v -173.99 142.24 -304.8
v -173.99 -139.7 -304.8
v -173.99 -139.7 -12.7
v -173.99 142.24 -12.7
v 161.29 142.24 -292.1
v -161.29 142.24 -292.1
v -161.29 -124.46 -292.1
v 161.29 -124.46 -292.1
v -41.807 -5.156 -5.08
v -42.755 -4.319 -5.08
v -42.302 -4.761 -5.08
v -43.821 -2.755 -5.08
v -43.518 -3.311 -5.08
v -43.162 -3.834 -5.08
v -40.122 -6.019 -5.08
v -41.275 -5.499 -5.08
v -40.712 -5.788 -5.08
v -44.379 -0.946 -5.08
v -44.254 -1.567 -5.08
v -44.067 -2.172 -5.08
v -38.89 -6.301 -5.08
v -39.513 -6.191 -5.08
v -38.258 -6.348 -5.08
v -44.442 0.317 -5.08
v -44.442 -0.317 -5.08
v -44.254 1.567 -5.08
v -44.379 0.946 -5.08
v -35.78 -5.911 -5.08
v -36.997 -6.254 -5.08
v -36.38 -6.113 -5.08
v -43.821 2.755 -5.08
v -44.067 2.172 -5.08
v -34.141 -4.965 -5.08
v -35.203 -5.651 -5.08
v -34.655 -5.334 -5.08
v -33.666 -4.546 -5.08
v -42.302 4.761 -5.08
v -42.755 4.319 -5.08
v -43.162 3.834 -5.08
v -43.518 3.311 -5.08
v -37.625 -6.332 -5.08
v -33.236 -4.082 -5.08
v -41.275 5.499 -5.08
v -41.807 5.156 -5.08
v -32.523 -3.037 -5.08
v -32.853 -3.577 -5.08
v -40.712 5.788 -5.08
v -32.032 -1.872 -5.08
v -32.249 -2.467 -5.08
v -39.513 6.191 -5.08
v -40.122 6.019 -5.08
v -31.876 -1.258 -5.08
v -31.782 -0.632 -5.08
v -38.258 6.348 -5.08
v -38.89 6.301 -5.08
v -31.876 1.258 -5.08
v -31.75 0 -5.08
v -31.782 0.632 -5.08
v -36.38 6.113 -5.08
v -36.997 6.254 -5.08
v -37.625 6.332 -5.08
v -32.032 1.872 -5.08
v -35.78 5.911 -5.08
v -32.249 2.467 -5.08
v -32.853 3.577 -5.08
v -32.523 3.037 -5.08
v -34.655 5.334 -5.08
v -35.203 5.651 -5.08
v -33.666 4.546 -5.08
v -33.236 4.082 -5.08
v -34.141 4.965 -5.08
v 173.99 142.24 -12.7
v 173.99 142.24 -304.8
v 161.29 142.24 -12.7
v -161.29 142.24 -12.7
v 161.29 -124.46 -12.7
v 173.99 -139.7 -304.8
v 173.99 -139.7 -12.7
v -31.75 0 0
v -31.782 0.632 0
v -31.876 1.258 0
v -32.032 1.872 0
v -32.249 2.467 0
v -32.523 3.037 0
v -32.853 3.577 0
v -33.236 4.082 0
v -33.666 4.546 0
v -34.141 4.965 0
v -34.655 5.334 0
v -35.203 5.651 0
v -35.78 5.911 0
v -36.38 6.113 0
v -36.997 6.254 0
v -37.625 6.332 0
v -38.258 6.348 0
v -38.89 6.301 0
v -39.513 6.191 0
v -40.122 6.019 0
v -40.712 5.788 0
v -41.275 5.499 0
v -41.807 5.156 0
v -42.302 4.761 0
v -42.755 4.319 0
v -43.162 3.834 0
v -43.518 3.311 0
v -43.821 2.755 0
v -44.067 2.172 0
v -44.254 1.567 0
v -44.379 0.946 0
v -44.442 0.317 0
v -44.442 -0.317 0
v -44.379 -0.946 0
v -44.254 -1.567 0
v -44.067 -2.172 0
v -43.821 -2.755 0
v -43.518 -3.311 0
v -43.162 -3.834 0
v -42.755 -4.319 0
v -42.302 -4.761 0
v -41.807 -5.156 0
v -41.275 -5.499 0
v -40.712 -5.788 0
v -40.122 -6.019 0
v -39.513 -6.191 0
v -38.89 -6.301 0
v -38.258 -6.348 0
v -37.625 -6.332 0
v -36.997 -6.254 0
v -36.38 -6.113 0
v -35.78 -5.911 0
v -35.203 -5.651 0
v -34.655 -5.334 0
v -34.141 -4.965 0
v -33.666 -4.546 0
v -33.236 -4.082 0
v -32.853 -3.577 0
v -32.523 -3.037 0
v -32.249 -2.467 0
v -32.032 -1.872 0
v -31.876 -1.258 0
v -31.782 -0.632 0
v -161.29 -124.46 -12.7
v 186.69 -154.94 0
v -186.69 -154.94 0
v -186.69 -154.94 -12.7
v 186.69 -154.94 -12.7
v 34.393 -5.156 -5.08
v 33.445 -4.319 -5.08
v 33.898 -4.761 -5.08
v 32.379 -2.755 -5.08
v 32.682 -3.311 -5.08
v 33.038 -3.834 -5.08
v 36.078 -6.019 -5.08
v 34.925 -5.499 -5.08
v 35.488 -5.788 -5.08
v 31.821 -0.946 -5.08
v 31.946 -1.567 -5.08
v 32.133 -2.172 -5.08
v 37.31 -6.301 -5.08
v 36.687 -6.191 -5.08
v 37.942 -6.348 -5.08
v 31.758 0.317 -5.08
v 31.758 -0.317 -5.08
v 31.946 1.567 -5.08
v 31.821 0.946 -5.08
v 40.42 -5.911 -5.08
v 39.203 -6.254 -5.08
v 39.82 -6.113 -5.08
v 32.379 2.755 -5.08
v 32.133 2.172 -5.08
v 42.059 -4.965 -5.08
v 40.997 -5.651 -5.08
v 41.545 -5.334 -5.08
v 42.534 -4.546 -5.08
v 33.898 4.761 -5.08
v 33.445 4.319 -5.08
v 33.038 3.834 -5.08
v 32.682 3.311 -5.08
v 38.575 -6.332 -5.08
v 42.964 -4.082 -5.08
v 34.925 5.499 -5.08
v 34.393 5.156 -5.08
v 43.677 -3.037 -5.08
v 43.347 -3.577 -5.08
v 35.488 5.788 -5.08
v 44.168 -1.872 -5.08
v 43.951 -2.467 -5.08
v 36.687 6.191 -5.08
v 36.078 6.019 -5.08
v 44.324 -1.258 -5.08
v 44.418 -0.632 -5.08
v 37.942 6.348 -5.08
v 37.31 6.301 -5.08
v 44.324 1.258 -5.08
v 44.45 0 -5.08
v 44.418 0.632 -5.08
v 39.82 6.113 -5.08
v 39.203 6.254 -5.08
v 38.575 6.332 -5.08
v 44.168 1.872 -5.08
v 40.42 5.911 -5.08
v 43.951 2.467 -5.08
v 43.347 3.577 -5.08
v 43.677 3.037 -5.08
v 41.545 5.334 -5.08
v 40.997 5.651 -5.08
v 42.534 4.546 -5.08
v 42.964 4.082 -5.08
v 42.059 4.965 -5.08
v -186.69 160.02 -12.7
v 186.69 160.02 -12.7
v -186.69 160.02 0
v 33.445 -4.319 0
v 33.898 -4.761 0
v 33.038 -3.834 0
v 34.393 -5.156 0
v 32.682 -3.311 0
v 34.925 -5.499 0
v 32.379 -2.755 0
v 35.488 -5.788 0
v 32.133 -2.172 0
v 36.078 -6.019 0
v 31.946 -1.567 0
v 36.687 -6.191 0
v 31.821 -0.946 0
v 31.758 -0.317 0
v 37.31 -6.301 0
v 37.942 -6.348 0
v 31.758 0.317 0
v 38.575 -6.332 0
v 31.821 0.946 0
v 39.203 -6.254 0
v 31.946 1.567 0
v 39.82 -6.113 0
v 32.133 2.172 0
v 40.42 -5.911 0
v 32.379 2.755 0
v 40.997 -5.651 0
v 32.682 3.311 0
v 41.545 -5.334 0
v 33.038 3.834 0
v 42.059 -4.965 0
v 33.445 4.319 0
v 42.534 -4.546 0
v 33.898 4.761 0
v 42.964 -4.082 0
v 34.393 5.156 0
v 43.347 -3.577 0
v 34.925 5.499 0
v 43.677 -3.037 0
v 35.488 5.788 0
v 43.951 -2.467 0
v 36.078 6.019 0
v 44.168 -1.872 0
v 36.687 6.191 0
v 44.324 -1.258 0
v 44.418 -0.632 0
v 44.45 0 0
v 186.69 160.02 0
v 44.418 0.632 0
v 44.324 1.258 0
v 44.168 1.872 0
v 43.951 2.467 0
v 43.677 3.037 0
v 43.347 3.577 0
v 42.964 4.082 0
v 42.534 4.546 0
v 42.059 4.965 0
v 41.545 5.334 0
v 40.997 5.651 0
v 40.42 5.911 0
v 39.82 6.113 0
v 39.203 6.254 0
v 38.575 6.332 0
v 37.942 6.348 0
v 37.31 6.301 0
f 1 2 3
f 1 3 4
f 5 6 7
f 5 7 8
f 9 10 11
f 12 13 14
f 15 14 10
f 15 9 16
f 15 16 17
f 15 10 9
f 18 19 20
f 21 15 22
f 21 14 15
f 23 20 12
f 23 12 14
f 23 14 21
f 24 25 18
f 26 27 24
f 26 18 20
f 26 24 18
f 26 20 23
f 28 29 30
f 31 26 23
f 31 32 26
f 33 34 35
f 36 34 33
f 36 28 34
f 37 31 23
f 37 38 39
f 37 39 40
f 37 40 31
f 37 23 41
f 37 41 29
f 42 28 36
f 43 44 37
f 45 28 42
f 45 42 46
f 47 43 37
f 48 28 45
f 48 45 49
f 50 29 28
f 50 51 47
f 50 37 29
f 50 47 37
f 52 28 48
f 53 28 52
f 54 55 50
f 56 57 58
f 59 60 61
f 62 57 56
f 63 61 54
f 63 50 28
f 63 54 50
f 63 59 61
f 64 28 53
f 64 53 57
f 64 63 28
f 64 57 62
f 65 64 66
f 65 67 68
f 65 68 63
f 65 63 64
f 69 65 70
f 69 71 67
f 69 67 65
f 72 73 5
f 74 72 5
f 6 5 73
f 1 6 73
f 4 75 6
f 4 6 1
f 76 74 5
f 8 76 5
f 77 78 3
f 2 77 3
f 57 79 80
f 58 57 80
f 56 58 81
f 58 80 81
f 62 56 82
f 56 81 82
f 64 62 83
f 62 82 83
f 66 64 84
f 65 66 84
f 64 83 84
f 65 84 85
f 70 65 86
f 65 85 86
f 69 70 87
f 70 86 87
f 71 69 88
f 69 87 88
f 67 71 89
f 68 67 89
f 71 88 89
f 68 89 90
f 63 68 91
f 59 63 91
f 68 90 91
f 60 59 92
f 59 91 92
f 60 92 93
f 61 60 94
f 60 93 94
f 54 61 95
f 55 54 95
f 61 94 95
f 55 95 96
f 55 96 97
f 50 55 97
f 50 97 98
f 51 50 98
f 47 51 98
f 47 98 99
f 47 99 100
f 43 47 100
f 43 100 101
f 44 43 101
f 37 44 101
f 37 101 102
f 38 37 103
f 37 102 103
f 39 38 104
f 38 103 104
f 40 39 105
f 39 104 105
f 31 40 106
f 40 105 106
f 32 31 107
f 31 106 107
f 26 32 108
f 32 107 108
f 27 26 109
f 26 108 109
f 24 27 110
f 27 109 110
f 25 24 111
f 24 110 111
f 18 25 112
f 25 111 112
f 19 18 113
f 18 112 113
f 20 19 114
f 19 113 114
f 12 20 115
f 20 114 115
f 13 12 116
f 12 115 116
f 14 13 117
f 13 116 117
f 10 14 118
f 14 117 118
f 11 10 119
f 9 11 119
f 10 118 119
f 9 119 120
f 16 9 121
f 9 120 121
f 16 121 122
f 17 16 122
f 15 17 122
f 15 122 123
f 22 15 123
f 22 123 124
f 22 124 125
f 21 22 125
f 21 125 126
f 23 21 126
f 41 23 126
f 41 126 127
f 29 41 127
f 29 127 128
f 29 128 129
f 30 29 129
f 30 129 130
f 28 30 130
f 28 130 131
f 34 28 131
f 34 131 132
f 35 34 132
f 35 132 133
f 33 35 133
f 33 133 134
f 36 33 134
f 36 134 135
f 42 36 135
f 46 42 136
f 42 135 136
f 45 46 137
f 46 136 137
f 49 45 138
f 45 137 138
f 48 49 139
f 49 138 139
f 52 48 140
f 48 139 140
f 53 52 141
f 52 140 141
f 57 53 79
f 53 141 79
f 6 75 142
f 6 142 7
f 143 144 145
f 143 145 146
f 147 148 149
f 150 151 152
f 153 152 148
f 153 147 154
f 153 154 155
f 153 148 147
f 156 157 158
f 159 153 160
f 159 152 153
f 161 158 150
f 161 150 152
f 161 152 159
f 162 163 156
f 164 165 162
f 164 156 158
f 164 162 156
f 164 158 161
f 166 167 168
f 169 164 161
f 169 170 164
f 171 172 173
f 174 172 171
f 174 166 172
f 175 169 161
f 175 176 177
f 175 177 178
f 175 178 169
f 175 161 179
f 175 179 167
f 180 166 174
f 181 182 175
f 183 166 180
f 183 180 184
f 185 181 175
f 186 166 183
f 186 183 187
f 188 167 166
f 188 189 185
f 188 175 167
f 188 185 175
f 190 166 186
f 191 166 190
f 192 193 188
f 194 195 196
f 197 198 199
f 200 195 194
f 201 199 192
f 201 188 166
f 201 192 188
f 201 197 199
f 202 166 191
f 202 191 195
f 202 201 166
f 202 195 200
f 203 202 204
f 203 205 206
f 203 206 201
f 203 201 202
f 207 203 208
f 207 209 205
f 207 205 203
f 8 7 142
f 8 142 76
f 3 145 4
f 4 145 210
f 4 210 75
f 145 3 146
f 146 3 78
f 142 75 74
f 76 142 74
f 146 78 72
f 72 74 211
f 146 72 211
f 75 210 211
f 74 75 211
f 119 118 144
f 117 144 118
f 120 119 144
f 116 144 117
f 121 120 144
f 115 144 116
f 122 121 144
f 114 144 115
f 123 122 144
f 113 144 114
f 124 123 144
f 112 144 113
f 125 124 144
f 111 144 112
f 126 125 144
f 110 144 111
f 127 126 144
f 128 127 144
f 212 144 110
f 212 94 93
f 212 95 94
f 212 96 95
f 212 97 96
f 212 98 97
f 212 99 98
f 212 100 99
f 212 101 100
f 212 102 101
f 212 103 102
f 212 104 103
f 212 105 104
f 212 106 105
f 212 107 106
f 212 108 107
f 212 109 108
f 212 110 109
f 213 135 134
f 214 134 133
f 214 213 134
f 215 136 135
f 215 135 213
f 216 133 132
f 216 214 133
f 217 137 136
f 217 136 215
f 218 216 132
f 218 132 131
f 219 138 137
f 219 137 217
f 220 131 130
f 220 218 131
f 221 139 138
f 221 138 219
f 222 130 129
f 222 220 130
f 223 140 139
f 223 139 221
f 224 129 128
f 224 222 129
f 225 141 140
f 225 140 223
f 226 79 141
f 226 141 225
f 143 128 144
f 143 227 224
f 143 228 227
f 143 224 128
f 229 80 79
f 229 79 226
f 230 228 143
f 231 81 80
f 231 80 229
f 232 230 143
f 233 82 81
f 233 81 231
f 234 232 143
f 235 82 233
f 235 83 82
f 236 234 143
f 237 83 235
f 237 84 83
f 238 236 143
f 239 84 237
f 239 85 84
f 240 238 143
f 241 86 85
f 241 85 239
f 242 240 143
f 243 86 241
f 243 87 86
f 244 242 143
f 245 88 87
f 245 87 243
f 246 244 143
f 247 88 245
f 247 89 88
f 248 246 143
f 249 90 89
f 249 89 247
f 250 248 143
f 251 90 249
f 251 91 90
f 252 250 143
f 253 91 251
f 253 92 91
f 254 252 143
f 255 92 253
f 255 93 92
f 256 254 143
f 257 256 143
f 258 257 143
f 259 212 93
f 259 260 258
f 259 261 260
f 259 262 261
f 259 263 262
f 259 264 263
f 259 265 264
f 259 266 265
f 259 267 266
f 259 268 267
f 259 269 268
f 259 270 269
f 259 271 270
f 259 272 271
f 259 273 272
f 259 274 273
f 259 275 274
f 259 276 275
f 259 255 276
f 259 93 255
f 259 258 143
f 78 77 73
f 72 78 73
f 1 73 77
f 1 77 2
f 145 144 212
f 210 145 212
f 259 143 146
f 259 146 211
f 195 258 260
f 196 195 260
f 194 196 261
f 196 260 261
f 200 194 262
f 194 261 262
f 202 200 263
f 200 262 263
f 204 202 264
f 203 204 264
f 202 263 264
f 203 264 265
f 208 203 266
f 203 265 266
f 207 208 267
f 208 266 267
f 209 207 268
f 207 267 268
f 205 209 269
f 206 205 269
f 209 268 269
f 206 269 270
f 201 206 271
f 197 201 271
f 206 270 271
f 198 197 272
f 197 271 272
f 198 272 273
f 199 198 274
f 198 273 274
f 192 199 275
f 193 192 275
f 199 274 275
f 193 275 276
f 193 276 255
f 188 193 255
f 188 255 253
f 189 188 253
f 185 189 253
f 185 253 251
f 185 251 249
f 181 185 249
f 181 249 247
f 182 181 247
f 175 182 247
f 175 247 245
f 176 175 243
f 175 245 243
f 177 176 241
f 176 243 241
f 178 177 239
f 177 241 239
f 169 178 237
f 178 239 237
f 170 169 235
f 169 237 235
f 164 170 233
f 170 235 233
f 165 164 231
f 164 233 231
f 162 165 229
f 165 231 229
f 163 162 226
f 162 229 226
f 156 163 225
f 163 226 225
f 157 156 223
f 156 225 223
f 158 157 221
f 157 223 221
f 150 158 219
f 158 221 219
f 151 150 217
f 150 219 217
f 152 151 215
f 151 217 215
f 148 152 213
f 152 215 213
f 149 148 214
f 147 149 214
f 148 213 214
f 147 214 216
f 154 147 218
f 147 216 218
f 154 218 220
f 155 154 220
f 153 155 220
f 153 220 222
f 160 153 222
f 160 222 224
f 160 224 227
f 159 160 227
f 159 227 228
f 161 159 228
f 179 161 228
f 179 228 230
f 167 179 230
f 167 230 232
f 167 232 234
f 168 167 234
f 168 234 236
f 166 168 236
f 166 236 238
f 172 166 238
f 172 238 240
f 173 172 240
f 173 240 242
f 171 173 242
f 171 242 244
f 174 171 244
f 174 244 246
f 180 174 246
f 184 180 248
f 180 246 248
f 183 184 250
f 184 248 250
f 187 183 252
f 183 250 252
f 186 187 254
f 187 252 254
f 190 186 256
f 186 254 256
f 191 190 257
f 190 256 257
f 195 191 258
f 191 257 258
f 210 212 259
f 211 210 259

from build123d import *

# Parameters (mm, degrees)
SKETCH1_W           = 373.38
SKETCH1_H           = 309.88
BOSS_EXTRUDE1_DEPTH = 12.7
SKETCH2_W           = 347.98
SKETCH2_H           = 281.94
BOSS_EXTRUDE2_DEPTH = 292.1
SKETCH3_W           = 322.58
SKETCH3_H           = 279.4
CUT_EXTRUDE1_DEPTH  = 266.7
SKETCH4_R           = 6.35
CUT_EXTRUDE2_DEPTH  = 5.08
SKETCH5_W           = 373.38
SKETCH5_H           = 5.08
BOSS_EXTRUDE3_DEPTH = 12.7


with BuildPart() as part:
    # Sketch1 → Boss-Extrude1 (new body)
    with BuildSketch(Plane.XY):
        Rectangle(SKETCH1_W, SKETCH1_H)
    extrude(amount=-BOSS_EXTRUDE1_DEPTH)

    # Sketch2 → Boss-Extrude2 (add)
    with BuildSketch(Plane(origin=(0, 0, -12.7), x_dir=(-1, 0, 0), z_dir=(0, 0, -1))):
        with Locations((0, 1.27)):
            Rectangle(SKETCH2_W, SKETCH2_H)
    extrude(amount=BOSS_EXTRUDE2_DEPTH)

    # Sketch3 → Cut-Extrude1 (cut)
    with BuildSketch(Plane(origin=(0, 142.24, 0), x_dir=(1, 0, 0), z_dir=(0, 1, 0))):
        with Locations((0, 152.4)):
            Rectangle(SKETCH3_W, SKETCH3_H)
    extrude(amount=-CUT_EXTRUDE1_DEPTH, mode=Mode.SUBTRACT)

    # Sketch4 → Cut-Extrude2 (cut)
    with BuildSketch(Plane.XY):
        with Locations((-38.1, 0)):
            Circle(SKETCH4_R)
        with Locations((38.1, 0)):
            Circle(SKETCH4_R)
    extrude(amount=-CUT_EXTRUDE2_DEPTH, mode=Mode.SUBTRACT)

    # Sketch5 → Boss-Extrude3 (add)
    with BuildSketch(Plane.XY):
        with Locations((0, 157.48)):
            Rectangle(SKETCH5_W, SKETCH5_H)
    extrude(amount=-BOSS_EXTRUDE3_DEPTH)


solid = part.part
